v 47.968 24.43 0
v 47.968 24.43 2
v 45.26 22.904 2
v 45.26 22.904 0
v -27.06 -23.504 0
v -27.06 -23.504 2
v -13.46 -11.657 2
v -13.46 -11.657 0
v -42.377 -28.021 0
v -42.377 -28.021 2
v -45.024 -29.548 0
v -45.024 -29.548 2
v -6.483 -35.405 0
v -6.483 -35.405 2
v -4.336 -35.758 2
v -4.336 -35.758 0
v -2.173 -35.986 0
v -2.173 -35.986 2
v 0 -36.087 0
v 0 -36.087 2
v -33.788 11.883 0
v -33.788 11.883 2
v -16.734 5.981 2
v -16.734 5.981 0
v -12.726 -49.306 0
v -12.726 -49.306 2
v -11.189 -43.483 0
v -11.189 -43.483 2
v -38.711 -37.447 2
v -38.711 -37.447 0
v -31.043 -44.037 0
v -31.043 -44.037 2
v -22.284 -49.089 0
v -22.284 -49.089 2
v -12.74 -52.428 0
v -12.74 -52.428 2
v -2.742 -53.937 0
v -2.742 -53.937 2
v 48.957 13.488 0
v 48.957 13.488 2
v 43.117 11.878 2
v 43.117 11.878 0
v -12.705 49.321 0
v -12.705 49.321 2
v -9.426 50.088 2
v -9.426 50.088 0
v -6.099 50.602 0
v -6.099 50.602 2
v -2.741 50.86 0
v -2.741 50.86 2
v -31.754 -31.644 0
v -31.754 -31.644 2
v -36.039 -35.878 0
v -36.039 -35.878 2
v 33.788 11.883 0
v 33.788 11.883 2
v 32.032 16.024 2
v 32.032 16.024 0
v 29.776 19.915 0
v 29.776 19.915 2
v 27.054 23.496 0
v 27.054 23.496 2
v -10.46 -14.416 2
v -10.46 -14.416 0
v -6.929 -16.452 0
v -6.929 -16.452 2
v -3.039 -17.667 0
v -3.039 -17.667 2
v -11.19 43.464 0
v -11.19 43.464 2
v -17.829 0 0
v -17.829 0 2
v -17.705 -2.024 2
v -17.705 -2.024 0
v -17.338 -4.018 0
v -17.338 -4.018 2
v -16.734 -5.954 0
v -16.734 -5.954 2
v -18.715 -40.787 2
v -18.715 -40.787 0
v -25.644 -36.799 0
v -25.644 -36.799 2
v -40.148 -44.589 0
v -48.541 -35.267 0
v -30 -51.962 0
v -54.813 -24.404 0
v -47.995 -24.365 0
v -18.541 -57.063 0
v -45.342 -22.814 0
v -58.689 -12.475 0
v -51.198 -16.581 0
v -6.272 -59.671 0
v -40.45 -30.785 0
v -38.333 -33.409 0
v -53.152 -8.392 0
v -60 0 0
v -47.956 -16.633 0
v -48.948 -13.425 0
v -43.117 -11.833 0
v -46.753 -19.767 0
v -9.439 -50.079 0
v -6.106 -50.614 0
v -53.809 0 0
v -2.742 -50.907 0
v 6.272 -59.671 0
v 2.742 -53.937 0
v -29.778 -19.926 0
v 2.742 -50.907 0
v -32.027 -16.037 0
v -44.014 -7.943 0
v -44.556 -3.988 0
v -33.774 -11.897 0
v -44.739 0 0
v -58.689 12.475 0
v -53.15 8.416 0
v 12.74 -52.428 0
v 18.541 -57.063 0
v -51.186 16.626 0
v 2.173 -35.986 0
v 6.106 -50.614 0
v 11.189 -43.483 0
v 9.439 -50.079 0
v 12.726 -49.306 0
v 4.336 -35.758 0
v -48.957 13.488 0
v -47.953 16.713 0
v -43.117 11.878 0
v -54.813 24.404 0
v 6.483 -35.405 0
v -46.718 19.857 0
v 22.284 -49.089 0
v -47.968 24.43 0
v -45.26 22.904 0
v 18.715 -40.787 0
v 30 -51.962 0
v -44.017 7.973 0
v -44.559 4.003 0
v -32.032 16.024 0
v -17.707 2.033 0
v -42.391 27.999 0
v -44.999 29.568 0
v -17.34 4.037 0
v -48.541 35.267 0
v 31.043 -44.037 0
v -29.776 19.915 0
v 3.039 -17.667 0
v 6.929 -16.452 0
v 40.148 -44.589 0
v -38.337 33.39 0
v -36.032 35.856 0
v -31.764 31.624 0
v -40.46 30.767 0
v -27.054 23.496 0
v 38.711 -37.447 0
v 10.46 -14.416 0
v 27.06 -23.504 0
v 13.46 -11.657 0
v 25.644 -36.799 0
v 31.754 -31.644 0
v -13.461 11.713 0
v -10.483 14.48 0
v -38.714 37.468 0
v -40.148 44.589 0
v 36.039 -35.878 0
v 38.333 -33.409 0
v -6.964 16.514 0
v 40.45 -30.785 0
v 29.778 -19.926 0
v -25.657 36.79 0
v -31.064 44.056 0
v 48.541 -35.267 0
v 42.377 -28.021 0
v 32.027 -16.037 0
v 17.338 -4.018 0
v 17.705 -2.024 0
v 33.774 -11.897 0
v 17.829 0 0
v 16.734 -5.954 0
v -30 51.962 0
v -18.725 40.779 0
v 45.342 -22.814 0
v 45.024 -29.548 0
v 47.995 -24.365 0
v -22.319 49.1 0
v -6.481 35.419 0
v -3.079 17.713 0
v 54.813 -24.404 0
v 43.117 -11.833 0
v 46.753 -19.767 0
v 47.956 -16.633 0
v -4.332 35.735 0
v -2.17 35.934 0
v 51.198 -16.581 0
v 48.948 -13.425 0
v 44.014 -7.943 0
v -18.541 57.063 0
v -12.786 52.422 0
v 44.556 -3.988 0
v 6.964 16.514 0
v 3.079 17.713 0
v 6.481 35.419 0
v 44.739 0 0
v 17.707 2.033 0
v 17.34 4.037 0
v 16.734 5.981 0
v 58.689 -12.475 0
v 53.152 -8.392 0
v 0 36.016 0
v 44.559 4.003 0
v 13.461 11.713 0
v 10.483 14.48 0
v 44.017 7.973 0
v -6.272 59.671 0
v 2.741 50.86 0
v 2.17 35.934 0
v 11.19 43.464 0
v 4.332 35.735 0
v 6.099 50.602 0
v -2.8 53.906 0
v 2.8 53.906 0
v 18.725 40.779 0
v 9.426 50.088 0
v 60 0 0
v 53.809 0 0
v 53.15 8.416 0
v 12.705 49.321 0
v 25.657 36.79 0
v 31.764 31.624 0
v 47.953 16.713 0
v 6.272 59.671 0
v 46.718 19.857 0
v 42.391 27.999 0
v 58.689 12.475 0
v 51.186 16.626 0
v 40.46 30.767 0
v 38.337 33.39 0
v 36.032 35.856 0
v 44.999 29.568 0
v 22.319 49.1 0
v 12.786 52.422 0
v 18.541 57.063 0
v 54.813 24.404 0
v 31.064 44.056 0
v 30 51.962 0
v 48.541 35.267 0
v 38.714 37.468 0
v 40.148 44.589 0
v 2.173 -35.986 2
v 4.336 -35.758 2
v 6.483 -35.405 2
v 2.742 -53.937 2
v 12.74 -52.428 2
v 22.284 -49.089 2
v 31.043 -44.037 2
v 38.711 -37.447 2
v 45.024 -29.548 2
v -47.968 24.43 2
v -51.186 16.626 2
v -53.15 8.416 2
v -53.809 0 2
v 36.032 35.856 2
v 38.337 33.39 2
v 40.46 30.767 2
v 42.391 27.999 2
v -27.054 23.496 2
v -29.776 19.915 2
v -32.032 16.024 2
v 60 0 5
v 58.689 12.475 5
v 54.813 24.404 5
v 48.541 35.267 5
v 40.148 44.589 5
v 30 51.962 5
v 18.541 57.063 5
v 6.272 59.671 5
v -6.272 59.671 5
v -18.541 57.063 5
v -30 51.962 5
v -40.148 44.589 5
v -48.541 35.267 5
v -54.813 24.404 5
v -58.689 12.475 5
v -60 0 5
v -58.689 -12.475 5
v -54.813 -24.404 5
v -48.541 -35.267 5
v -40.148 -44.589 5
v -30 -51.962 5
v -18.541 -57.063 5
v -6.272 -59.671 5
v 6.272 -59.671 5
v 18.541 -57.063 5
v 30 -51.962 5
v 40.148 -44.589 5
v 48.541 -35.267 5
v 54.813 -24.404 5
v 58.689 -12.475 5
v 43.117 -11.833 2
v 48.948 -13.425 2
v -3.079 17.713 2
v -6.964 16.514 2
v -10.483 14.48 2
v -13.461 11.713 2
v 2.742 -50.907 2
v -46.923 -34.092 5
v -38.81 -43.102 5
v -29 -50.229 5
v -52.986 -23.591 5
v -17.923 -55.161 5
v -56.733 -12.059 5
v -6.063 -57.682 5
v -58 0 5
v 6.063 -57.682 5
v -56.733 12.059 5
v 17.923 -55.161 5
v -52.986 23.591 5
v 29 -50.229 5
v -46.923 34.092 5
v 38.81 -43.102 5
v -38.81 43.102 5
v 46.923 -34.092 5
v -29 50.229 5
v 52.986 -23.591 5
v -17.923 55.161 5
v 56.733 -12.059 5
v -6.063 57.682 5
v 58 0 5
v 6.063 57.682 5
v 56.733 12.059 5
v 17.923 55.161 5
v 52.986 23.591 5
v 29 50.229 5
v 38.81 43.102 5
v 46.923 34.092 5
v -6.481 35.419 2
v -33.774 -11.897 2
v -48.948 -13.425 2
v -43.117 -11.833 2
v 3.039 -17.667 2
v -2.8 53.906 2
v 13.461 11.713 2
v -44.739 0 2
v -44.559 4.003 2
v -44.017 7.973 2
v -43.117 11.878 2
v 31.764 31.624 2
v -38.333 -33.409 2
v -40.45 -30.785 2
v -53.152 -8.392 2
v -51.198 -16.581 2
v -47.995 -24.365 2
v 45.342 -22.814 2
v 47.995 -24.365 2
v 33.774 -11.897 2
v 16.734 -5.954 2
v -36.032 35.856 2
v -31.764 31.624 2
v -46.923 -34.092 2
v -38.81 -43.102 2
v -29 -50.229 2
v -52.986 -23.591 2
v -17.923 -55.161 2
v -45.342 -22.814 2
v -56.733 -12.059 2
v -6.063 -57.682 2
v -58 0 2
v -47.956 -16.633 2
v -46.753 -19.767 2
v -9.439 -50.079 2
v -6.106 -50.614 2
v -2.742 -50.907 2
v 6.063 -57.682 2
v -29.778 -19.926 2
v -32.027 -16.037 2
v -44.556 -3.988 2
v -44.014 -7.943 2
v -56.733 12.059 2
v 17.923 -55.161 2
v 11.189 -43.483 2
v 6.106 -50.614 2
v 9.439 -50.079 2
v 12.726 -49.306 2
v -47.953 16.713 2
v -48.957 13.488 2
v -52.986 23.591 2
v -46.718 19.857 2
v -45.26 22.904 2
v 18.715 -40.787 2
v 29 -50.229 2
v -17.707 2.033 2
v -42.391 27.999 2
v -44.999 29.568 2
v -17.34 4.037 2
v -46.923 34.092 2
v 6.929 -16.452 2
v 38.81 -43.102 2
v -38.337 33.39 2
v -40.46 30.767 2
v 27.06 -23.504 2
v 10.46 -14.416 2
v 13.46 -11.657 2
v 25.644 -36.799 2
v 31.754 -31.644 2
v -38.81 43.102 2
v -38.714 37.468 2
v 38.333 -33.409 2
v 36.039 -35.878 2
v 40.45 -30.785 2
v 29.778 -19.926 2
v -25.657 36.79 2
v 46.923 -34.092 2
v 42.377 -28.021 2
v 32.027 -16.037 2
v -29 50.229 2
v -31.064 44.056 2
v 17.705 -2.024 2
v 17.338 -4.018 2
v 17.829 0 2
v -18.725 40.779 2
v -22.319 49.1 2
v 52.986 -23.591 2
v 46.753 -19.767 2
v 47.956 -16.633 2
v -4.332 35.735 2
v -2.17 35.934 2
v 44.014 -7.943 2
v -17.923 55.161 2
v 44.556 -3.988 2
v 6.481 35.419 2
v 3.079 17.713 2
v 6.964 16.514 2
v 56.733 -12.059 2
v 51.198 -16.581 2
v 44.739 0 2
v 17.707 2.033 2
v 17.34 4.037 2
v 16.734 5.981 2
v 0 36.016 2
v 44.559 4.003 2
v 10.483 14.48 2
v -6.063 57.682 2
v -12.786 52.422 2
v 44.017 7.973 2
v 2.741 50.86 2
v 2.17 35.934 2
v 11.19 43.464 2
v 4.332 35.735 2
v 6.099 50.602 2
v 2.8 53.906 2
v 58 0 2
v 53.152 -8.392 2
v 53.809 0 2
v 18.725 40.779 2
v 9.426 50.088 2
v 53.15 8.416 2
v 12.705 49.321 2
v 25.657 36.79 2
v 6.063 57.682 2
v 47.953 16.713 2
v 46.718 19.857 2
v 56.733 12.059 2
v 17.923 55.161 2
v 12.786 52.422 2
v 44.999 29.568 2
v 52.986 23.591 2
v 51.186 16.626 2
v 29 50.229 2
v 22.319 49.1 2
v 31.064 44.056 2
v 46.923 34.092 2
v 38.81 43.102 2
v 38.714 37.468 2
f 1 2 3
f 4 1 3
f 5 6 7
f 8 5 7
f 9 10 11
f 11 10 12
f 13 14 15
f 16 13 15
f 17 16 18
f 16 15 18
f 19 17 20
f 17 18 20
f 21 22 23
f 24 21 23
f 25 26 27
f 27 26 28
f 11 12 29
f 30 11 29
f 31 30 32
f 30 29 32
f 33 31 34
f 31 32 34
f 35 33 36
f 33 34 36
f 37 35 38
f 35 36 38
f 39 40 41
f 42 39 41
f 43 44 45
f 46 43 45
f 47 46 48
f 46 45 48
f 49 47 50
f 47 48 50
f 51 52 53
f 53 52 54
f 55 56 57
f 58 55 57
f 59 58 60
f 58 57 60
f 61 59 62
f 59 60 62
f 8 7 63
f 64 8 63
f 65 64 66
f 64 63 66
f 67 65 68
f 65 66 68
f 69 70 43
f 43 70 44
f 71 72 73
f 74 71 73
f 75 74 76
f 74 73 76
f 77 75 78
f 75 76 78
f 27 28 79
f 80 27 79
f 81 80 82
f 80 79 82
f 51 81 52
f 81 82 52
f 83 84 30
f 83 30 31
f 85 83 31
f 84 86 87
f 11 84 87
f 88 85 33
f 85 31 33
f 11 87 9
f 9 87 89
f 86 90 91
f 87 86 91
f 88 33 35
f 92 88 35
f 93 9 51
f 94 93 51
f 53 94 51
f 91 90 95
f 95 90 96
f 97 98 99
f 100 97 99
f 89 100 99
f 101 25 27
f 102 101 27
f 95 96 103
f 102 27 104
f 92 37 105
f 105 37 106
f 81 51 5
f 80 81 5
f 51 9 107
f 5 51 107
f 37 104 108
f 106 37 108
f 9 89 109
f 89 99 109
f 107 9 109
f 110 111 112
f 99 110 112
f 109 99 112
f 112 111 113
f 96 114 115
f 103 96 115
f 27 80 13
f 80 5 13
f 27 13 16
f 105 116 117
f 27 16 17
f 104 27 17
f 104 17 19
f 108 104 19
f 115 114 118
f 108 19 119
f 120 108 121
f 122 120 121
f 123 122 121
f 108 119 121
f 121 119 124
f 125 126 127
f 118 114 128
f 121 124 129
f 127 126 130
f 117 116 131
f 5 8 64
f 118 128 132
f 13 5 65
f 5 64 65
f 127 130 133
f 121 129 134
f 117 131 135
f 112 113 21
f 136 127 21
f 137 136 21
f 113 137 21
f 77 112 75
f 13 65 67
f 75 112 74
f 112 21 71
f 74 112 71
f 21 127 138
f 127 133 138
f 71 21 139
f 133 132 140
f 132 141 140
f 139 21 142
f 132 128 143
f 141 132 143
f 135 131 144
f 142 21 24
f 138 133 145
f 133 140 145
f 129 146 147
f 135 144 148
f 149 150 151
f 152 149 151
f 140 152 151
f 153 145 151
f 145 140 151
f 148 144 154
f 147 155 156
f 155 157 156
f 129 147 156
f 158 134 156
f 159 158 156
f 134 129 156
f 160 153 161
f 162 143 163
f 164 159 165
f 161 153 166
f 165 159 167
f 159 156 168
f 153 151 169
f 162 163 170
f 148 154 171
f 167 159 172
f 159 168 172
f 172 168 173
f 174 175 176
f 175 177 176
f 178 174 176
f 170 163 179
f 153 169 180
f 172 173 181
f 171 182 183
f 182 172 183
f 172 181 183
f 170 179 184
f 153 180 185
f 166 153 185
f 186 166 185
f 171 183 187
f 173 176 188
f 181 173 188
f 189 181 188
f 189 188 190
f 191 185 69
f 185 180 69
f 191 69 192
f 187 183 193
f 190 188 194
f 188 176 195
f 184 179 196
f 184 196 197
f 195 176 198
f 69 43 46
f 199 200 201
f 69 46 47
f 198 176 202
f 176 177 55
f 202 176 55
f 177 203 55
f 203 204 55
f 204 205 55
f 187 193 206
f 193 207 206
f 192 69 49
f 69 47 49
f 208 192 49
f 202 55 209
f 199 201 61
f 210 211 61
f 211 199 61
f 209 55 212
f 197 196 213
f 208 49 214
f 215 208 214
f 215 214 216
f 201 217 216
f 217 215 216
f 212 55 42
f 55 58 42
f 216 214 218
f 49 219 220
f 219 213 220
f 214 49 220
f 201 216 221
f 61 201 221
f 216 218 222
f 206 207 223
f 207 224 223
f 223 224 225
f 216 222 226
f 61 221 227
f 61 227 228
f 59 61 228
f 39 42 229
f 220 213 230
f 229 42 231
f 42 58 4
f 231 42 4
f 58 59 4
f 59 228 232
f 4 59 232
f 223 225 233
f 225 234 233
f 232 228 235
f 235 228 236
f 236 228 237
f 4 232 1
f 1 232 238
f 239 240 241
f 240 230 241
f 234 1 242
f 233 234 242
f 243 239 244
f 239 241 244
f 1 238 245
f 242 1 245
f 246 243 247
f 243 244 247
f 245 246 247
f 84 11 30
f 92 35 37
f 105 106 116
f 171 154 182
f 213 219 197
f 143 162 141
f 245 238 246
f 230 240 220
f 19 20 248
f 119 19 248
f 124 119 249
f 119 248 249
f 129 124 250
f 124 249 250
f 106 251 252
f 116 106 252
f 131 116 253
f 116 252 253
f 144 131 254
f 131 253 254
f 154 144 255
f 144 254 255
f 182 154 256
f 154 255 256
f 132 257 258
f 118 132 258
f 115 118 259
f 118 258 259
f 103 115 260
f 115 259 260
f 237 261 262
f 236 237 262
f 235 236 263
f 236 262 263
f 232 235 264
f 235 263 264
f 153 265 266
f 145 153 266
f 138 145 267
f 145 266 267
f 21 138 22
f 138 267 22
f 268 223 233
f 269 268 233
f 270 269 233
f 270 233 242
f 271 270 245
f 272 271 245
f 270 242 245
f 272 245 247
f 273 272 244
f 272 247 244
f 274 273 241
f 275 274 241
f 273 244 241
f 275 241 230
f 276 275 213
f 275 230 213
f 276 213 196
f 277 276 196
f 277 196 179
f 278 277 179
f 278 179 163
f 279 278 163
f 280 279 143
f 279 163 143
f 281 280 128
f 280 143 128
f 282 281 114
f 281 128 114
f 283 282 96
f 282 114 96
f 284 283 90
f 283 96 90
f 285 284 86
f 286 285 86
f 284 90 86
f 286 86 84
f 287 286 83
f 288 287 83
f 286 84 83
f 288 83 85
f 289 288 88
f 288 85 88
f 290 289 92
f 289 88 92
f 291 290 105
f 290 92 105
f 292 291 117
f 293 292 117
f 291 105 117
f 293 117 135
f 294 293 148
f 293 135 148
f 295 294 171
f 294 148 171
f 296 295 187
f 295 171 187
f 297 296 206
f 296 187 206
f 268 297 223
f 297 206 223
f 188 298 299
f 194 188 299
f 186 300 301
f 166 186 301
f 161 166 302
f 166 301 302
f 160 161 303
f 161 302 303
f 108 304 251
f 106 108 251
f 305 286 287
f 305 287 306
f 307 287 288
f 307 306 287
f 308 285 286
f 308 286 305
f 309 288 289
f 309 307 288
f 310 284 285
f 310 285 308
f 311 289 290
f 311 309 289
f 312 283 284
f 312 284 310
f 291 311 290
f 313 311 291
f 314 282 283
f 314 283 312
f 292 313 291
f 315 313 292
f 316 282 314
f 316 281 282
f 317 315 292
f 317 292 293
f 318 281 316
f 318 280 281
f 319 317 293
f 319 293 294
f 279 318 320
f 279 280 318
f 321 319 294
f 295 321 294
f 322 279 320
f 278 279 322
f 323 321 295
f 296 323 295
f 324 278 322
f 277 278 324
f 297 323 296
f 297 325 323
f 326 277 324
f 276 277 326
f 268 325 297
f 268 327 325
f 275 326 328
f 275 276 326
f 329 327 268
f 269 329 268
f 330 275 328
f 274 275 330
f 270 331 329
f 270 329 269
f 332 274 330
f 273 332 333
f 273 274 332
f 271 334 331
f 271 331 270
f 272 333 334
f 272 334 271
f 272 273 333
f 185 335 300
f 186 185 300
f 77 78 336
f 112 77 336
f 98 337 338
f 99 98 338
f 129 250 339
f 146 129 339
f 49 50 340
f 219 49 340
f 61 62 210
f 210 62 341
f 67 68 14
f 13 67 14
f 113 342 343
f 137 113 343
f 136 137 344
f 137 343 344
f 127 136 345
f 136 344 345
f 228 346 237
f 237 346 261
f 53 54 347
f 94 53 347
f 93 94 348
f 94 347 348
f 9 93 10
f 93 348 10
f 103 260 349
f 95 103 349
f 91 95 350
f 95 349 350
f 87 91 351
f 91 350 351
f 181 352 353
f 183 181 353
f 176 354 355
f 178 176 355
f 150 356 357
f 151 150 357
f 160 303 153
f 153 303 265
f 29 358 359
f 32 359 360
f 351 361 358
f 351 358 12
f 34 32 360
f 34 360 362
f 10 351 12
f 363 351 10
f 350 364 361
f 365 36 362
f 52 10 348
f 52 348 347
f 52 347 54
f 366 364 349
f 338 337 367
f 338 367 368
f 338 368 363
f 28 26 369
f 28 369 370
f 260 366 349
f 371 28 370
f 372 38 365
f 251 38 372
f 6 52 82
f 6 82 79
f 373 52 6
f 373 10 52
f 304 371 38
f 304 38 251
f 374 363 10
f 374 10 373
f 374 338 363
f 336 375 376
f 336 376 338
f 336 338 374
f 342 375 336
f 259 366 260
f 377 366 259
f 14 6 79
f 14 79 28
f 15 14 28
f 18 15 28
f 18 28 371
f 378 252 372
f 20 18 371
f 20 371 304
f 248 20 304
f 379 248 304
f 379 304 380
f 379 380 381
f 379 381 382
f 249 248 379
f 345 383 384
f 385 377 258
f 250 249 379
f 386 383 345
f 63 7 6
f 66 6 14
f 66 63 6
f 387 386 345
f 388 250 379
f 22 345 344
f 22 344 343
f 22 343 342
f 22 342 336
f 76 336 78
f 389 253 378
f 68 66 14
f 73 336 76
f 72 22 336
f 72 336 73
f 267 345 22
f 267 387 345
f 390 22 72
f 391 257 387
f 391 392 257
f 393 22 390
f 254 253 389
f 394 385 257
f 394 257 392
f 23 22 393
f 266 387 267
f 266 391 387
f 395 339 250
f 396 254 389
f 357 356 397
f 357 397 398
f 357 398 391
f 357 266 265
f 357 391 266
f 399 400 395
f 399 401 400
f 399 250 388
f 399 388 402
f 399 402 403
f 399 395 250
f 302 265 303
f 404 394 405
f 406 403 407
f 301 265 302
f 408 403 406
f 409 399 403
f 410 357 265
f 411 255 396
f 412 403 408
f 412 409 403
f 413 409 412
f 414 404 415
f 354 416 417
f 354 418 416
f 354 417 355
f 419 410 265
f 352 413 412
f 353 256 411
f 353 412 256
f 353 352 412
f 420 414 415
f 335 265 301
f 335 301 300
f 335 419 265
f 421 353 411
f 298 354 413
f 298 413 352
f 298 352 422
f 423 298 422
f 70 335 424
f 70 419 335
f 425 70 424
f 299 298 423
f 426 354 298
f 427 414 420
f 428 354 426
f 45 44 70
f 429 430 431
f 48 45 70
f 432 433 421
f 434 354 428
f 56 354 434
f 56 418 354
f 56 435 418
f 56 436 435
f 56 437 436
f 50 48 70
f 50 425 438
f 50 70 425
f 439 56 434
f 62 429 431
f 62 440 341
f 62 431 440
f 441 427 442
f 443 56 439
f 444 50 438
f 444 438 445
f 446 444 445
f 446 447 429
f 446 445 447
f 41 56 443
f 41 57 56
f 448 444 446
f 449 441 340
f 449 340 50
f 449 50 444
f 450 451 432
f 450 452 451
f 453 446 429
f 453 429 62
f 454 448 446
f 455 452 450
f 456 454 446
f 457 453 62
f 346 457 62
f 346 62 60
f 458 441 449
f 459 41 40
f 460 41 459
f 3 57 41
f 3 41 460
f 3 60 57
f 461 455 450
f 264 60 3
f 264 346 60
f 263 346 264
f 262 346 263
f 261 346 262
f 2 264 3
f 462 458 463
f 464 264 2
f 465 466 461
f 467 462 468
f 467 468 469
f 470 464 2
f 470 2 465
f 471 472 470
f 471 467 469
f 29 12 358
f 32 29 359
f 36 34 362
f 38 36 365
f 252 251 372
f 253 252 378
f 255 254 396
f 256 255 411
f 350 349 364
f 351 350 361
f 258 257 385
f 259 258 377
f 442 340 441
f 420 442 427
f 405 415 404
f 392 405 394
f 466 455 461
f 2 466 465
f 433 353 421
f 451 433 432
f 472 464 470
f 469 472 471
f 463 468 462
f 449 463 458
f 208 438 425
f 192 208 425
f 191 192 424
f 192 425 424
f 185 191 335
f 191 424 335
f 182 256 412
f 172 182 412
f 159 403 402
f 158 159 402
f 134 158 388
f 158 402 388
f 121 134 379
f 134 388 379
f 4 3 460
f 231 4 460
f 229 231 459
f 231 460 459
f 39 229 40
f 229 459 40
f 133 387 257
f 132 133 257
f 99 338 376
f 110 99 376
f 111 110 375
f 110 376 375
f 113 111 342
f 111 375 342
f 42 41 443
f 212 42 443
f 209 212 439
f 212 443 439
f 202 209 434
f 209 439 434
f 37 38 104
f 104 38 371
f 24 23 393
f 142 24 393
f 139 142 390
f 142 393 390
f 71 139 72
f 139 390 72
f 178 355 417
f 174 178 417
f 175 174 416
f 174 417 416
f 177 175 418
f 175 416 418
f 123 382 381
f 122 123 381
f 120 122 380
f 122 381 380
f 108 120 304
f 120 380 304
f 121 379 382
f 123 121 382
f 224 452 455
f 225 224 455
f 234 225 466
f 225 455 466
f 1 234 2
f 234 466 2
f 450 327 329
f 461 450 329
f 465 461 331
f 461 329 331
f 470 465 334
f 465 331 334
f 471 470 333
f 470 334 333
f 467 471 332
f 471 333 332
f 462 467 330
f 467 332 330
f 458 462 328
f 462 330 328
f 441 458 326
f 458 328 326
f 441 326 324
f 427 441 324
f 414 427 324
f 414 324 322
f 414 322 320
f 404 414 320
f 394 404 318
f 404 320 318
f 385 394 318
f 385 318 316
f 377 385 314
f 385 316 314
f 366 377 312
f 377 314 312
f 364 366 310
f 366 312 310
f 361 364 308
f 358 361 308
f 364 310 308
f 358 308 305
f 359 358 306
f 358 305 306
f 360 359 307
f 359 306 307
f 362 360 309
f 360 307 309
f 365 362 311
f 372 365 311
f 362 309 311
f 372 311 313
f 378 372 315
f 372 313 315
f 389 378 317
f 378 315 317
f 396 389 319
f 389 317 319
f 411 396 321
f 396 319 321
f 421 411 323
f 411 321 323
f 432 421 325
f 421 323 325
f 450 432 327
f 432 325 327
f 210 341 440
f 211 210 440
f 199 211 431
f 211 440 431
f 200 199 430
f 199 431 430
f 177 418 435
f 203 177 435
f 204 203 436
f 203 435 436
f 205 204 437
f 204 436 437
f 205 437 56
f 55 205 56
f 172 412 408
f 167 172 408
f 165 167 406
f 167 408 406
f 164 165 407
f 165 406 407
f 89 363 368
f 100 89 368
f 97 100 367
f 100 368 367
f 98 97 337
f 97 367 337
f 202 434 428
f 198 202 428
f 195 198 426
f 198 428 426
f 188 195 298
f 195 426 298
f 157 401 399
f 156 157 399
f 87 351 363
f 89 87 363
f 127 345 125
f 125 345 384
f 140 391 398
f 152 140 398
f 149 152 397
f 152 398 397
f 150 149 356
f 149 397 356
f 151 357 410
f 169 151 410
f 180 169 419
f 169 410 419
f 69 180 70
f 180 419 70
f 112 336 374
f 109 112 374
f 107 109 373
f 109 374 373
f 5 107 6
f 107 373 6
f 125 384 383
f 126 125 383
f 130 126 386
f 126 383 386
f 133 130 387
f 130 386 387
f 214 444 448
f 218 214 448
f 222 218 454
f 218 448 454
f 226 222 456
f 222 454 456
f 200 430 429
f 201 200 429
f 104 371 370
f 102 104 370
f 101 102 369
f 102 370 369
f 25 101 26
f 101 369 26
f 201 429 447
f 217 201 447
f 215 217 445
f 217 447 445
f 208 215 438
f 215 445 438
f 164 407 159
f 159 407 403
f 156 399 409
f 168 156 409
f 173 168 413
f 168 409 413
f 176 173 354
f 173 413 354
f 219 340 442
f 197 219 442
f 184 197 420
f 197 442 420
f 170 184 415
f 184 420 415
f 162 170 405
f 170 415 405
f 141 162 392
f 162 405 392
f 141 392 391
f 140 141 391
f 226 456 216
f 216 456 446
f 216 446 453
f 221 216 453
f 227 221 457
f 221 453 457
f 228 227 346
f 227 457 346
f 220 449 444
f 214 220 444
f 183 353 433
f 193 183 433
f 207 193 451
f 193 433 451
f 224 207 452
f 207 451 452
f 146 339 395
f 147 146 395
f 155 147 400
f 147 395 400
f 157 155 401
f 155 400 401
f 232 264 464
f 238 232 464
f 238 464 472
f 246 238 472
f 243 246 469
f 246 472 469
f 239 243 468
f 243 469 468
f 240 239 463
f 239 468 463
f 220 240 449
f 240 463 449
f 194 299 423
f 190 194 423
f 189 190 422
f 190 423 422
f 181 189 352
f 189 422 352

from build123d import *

# Parameters (mm, degrees)
F0_R     = 60
F1_DEPTH = 5
F3_DEPTH = 5.001
F4_R     = 58
F5_DEPTH = 3


with BuildPart() as f1:
    # F0 (on Top) → F1 (new body)
    with BuildSketch(Plane.XY):
        Circle(F0_R)
    extrude(amount=F1_DEPTH)

    # F2 (on face) → F3 (cut, through all)
    with BuildSketch(Plane.XY.offset(5)):
        with BuildLine():
            Line((-2.741307, 50.860289), (-2.800394, 53.905666))
            ThreePointArc((-2.800394, 53.905666), (-26.810197, 46.78331), (-44.999208, 29.568246))
            Line((-44.999208, 29.568246), (-42.39098, 27.998535))
            ThreePointArc((-42.39098, 27.998535), (-39.422273, 32.097611), (-36.032442, 35.855893))
            Line((-36.032442, 35.855893), (-31.764433, 31.624433))
            ThreePointArc((-31.764433, 31.624433), (-22.28061, 38.940283), (-11.190111, 43.46415))
            Line((-11.190111, 43.46415), (-12.704825, 49.321402))
            ThreePointArc((-12.704825, 49.321402), (-7.767263, 50.377001), (-2.741307, 50.860289))
        make_face()
        with BuildLine():
            Line((-53.808689, 0), (-44.738998, 0))
            ThreePointArc((-44.738998, 0), (-44.333174, 5.994104), (-43.11711, 11.877569))
            Line((-43.11711, 11.877569), (-48.95667, 13.487858))
            ThreePointArc((-48.95667, 13.487858), (-47.364057, 18.296418), (-45.259964, 22.904178))
            Line((-45.259964, 22.904178), (-47.967557, 24.430441))
            ThreePointArc((-47.967557, 24.430441), (-52.328709, 12.559654), (-53.808689, 0))
        make_face()
        with BuildLine():
            ThreePointArc((-43.11711, -11.832559), (-44.330124, -5.971391), (-44.738998, 0))
            Line((-44.738998, 0), (-53.808689, 0))
            ThreePointArc((-53.808689, 0), (-52.334607, -12.524554), (-47.995206, -24.365457))
            Line((-47.995206, -24.365457), (-45.342475, -22.814272))
            ThreePointArc((-45.342475, -22.814272), (-47.380636, -18.21008), (-48.948068, -13.42512))
            Line((-48.948068, -13.42512), (-43.11711, -11.832559))
        make_face()
        with BuildLine():
            Line((-42.377204, -28.020563), (-45.023724, -29.548192))
            ThreePointArc((-45.023724, -29.548192), (-26.781507, -46.767749), (-2.742129, -53.937126))
            Line((-2.742129, -53.937126), (-2.742129, -50.906584))
            ThreePointArc((-2.742129, -50.906584), (-7.777308, -50.376699), (-12.725699, -49.305607))
            Line((-12.725699, -49.305607), (-11.188747, -43.482557))
            ThreePointArc((-11.188747, -43.482557), (-22.268417, -38.947418), (-31.75433, -31.643718))
            Line((-31.75433, -31.643718), (-36.039297, -35.877891))
            ThreePointArc((-36.039297, -35.877891), (-39.414393, -32.115507), (-42.377204, -28.020563))
        make_face()
        with BuildLine():
            Line((0, -36.08707), (0, 0))
            Line((0, 0), (-17.828856, 0))
            ThreePointArc((-17.828856, 0), (-17.551636, -3.026807), (-16.733946, -5.954228))
            Line((-16.733946, -5.954228), (-33.773992, -11.896965))
            ThreePointArc((-33.773992, -11.896965), (-30.963522, -18.016735), (-27.060224, -23.504412))
            Line((-27.060224, -23.504412), (-13.459581, -11.657408))
            ThreePointArc((-13.459581, -11.657408), (-8.750525, -15.531259), (-3.038921, -17.66656))
            Line((-3.038921, -17.66656), (-6.482814, -35.405271))
            ThreePointArc((-6.482814, -35.405271), (-3.256267, -35.887467), (0, -36.08707))
        make_face()
        with BuildLine():
            Line((17.828856, 0), (0, 0))
            Line((0, 0), (0, -36.08707))
            ThreePointArc((0, -36.08707), (3.256267, -35.887467), (6.482814, -35.405271))
            Line((6.482814, -35.405271), (3.038921, -17.66656))
            ThreePointArc((3.038921, -17.66656), (8.750525, -15.531259), (13.459581, -11.657408))
            Line((13.459581, -11.657408), (27.060224, -23.504412))
            ThreePointArc((27.060224, -23.504412), (30.963522, -18.016735), (33.773992, -11.896965))
            Line((33.773992, -11.896965), (16.733946, -5.954228))
            ThreePointArc((16.733946, -5.954228), (17.551636, -3.026807), (17.828856, 0))
        make_face()
        with BuildLine():
            Line((0, 36.015704), (0, 0))
            Line((0, 0), (17.828856, 0))
            ThreePointArc((17.828856, 0), (17.554095, 3.040658), (16.733946, 5.981483))
            Line((16.733946, 5.981483), (33.78848, 11.882508))
            ThreePointArc((33.78848, 11.882508), (30.964356, 18.004289), (27.054407, 23.496481))
            Line((27.054407, 23.496481), (13.461306, 11.712858))
            ThreePointArc((13.461306, 11.712858), (8.780542, 15.595833), (3.079093, 17.712558))
            Line((3.079093, 17.712558), (6.480865, 35.418753))
            ThreePointArc((6.480865, 35.418753), (3.252606, 35.849388), (0, 36.015704))
        make_face()
        with BuildLine():
            Line((-17.828856, 0), (0, 0))
            Line((0, 0), (0, 36.015704))
            ThreePointArc((0, 36.015704), (-3.252606, 35.849388), (-6.480865, 35.418753))
            Line((-6.480865, 35.418753), (-3.079093, 17.712558))
            ThreePointArc((-3.079093, 17.712558), (-8.780542, 15.595833), (-13.461306, 11.712858))
            Line((-13.461306, 11.712858), (-27.054407, 23.496481))
            ThreePointArc((-27.054407, 23.496481), (-30.964356, 18.004289), (-33.78848, 11.882508))
            Line((-33.78848, 11.882508), (-16.733946, 5.981483))
            ThreePointArc((-16.733946, 5.981483), (-17.554095, 3.040658), (-17.828856, 0))
        make_face()
        with BuildLine():
            Line((2.742129, -50.906584), (2.742129, -53.937126))
            ThreePointArc((2.742129, -53.937126), (26.781507, -46.767749), (45.023724, -29.548192))
            Line((45.023724, -29.548192), (42.377204, -28.020563))
            ThreePointArc((42.377204, -28.020563), (39.414393, -32.115507), (36.039297, -35.877891))
            Line((36.039297, -35.877891), (31.75433, -31.643718))
            ThreePointArc((31.75433, -31.643718), (22.268417, -38.947418), (11.188747, -43.482557))
            Line((11.188747, -43.482557), (12.725699, -49.305607))
            ThreePointArc((12.725699, -49.305607), (7.777308, -50.376699), (2.742129, -50.906584))
        make_face()
        with BuildLine():
            ThreePointArc((43.11711, 11.877569), (44.333174, 5.994104), (44.738998, 0))
            Line((44.738998, 0), (53.808689, 0))
            ThreePointArc((53.808689, 0), (52.328709, 12.559654), (47.967557, 24.430441))
            Line((47.967557, 24.430441), (45.259964, 22.904178))
            ThreePointArc((45.259964, 22.904178), (47.364057, 18.296418), (48.95667, 13.487858))
            Line((48.95667, 13.487858), (43.11711, 11.877569))
        make_face()
        with BuildLine():
            Line((53.808689, 0), (44.738998, 0))
            ThreePointArc((44.738998, 0), (44.330124, -5.971391), (43.11711, -11.832559))
            Line((43.11711, -11.832559), (48.948068, -13.42512))
            ThreePointArc((48.948068, -13.42512), (47.380636, -18.21008), (45.342475, -22.814272))
            Line((45.342475, -22.814272), (47.995206, -24.365457))
            ThreePointArc((47.995206, -24.365457), (52.334607, -12.524554), (53.808689, 0))
        make_face()
        with BuildLine():
            Line((42.39098, 27.998535), (44.999208, 29.568246))
            ThreePointArc((44.999208, 29.568246), (26.810197, 46.78331), (2.800394, 53.905666))
            Line((2.800394, 53.905666), (2.741307, 50.860289))
            ThreePointArc((2.741307, 50.860289), (7.767263, 50.377001), (12.704825, 49.321402))
            Line((12.704825, 49.321402), (11.190111, 43.46415))
            ThreePointArc((11.190111, 43.46415), (22.28061, 38.940283), (31.764433, 31.624433))
            Line((31.764433, 31.624433), (36.032442, 35.855893))
            ThreePointArc((36.032442, 35.855893), (39.422273, 32.097611), (42.39098, 27.998535))
        make_face()
    extrude(amount=-F3_DEPTH, mode=Mode.SUBTRACT)

    # F4 (on face) → F5 (cut)
    with BuildSketch(Plane.XY.offset(5)):
        Circle(F4_R)
    extrude(amount=-F5_DEPTH, mode=Mode.SUBTRACT)


solid = f1.part
